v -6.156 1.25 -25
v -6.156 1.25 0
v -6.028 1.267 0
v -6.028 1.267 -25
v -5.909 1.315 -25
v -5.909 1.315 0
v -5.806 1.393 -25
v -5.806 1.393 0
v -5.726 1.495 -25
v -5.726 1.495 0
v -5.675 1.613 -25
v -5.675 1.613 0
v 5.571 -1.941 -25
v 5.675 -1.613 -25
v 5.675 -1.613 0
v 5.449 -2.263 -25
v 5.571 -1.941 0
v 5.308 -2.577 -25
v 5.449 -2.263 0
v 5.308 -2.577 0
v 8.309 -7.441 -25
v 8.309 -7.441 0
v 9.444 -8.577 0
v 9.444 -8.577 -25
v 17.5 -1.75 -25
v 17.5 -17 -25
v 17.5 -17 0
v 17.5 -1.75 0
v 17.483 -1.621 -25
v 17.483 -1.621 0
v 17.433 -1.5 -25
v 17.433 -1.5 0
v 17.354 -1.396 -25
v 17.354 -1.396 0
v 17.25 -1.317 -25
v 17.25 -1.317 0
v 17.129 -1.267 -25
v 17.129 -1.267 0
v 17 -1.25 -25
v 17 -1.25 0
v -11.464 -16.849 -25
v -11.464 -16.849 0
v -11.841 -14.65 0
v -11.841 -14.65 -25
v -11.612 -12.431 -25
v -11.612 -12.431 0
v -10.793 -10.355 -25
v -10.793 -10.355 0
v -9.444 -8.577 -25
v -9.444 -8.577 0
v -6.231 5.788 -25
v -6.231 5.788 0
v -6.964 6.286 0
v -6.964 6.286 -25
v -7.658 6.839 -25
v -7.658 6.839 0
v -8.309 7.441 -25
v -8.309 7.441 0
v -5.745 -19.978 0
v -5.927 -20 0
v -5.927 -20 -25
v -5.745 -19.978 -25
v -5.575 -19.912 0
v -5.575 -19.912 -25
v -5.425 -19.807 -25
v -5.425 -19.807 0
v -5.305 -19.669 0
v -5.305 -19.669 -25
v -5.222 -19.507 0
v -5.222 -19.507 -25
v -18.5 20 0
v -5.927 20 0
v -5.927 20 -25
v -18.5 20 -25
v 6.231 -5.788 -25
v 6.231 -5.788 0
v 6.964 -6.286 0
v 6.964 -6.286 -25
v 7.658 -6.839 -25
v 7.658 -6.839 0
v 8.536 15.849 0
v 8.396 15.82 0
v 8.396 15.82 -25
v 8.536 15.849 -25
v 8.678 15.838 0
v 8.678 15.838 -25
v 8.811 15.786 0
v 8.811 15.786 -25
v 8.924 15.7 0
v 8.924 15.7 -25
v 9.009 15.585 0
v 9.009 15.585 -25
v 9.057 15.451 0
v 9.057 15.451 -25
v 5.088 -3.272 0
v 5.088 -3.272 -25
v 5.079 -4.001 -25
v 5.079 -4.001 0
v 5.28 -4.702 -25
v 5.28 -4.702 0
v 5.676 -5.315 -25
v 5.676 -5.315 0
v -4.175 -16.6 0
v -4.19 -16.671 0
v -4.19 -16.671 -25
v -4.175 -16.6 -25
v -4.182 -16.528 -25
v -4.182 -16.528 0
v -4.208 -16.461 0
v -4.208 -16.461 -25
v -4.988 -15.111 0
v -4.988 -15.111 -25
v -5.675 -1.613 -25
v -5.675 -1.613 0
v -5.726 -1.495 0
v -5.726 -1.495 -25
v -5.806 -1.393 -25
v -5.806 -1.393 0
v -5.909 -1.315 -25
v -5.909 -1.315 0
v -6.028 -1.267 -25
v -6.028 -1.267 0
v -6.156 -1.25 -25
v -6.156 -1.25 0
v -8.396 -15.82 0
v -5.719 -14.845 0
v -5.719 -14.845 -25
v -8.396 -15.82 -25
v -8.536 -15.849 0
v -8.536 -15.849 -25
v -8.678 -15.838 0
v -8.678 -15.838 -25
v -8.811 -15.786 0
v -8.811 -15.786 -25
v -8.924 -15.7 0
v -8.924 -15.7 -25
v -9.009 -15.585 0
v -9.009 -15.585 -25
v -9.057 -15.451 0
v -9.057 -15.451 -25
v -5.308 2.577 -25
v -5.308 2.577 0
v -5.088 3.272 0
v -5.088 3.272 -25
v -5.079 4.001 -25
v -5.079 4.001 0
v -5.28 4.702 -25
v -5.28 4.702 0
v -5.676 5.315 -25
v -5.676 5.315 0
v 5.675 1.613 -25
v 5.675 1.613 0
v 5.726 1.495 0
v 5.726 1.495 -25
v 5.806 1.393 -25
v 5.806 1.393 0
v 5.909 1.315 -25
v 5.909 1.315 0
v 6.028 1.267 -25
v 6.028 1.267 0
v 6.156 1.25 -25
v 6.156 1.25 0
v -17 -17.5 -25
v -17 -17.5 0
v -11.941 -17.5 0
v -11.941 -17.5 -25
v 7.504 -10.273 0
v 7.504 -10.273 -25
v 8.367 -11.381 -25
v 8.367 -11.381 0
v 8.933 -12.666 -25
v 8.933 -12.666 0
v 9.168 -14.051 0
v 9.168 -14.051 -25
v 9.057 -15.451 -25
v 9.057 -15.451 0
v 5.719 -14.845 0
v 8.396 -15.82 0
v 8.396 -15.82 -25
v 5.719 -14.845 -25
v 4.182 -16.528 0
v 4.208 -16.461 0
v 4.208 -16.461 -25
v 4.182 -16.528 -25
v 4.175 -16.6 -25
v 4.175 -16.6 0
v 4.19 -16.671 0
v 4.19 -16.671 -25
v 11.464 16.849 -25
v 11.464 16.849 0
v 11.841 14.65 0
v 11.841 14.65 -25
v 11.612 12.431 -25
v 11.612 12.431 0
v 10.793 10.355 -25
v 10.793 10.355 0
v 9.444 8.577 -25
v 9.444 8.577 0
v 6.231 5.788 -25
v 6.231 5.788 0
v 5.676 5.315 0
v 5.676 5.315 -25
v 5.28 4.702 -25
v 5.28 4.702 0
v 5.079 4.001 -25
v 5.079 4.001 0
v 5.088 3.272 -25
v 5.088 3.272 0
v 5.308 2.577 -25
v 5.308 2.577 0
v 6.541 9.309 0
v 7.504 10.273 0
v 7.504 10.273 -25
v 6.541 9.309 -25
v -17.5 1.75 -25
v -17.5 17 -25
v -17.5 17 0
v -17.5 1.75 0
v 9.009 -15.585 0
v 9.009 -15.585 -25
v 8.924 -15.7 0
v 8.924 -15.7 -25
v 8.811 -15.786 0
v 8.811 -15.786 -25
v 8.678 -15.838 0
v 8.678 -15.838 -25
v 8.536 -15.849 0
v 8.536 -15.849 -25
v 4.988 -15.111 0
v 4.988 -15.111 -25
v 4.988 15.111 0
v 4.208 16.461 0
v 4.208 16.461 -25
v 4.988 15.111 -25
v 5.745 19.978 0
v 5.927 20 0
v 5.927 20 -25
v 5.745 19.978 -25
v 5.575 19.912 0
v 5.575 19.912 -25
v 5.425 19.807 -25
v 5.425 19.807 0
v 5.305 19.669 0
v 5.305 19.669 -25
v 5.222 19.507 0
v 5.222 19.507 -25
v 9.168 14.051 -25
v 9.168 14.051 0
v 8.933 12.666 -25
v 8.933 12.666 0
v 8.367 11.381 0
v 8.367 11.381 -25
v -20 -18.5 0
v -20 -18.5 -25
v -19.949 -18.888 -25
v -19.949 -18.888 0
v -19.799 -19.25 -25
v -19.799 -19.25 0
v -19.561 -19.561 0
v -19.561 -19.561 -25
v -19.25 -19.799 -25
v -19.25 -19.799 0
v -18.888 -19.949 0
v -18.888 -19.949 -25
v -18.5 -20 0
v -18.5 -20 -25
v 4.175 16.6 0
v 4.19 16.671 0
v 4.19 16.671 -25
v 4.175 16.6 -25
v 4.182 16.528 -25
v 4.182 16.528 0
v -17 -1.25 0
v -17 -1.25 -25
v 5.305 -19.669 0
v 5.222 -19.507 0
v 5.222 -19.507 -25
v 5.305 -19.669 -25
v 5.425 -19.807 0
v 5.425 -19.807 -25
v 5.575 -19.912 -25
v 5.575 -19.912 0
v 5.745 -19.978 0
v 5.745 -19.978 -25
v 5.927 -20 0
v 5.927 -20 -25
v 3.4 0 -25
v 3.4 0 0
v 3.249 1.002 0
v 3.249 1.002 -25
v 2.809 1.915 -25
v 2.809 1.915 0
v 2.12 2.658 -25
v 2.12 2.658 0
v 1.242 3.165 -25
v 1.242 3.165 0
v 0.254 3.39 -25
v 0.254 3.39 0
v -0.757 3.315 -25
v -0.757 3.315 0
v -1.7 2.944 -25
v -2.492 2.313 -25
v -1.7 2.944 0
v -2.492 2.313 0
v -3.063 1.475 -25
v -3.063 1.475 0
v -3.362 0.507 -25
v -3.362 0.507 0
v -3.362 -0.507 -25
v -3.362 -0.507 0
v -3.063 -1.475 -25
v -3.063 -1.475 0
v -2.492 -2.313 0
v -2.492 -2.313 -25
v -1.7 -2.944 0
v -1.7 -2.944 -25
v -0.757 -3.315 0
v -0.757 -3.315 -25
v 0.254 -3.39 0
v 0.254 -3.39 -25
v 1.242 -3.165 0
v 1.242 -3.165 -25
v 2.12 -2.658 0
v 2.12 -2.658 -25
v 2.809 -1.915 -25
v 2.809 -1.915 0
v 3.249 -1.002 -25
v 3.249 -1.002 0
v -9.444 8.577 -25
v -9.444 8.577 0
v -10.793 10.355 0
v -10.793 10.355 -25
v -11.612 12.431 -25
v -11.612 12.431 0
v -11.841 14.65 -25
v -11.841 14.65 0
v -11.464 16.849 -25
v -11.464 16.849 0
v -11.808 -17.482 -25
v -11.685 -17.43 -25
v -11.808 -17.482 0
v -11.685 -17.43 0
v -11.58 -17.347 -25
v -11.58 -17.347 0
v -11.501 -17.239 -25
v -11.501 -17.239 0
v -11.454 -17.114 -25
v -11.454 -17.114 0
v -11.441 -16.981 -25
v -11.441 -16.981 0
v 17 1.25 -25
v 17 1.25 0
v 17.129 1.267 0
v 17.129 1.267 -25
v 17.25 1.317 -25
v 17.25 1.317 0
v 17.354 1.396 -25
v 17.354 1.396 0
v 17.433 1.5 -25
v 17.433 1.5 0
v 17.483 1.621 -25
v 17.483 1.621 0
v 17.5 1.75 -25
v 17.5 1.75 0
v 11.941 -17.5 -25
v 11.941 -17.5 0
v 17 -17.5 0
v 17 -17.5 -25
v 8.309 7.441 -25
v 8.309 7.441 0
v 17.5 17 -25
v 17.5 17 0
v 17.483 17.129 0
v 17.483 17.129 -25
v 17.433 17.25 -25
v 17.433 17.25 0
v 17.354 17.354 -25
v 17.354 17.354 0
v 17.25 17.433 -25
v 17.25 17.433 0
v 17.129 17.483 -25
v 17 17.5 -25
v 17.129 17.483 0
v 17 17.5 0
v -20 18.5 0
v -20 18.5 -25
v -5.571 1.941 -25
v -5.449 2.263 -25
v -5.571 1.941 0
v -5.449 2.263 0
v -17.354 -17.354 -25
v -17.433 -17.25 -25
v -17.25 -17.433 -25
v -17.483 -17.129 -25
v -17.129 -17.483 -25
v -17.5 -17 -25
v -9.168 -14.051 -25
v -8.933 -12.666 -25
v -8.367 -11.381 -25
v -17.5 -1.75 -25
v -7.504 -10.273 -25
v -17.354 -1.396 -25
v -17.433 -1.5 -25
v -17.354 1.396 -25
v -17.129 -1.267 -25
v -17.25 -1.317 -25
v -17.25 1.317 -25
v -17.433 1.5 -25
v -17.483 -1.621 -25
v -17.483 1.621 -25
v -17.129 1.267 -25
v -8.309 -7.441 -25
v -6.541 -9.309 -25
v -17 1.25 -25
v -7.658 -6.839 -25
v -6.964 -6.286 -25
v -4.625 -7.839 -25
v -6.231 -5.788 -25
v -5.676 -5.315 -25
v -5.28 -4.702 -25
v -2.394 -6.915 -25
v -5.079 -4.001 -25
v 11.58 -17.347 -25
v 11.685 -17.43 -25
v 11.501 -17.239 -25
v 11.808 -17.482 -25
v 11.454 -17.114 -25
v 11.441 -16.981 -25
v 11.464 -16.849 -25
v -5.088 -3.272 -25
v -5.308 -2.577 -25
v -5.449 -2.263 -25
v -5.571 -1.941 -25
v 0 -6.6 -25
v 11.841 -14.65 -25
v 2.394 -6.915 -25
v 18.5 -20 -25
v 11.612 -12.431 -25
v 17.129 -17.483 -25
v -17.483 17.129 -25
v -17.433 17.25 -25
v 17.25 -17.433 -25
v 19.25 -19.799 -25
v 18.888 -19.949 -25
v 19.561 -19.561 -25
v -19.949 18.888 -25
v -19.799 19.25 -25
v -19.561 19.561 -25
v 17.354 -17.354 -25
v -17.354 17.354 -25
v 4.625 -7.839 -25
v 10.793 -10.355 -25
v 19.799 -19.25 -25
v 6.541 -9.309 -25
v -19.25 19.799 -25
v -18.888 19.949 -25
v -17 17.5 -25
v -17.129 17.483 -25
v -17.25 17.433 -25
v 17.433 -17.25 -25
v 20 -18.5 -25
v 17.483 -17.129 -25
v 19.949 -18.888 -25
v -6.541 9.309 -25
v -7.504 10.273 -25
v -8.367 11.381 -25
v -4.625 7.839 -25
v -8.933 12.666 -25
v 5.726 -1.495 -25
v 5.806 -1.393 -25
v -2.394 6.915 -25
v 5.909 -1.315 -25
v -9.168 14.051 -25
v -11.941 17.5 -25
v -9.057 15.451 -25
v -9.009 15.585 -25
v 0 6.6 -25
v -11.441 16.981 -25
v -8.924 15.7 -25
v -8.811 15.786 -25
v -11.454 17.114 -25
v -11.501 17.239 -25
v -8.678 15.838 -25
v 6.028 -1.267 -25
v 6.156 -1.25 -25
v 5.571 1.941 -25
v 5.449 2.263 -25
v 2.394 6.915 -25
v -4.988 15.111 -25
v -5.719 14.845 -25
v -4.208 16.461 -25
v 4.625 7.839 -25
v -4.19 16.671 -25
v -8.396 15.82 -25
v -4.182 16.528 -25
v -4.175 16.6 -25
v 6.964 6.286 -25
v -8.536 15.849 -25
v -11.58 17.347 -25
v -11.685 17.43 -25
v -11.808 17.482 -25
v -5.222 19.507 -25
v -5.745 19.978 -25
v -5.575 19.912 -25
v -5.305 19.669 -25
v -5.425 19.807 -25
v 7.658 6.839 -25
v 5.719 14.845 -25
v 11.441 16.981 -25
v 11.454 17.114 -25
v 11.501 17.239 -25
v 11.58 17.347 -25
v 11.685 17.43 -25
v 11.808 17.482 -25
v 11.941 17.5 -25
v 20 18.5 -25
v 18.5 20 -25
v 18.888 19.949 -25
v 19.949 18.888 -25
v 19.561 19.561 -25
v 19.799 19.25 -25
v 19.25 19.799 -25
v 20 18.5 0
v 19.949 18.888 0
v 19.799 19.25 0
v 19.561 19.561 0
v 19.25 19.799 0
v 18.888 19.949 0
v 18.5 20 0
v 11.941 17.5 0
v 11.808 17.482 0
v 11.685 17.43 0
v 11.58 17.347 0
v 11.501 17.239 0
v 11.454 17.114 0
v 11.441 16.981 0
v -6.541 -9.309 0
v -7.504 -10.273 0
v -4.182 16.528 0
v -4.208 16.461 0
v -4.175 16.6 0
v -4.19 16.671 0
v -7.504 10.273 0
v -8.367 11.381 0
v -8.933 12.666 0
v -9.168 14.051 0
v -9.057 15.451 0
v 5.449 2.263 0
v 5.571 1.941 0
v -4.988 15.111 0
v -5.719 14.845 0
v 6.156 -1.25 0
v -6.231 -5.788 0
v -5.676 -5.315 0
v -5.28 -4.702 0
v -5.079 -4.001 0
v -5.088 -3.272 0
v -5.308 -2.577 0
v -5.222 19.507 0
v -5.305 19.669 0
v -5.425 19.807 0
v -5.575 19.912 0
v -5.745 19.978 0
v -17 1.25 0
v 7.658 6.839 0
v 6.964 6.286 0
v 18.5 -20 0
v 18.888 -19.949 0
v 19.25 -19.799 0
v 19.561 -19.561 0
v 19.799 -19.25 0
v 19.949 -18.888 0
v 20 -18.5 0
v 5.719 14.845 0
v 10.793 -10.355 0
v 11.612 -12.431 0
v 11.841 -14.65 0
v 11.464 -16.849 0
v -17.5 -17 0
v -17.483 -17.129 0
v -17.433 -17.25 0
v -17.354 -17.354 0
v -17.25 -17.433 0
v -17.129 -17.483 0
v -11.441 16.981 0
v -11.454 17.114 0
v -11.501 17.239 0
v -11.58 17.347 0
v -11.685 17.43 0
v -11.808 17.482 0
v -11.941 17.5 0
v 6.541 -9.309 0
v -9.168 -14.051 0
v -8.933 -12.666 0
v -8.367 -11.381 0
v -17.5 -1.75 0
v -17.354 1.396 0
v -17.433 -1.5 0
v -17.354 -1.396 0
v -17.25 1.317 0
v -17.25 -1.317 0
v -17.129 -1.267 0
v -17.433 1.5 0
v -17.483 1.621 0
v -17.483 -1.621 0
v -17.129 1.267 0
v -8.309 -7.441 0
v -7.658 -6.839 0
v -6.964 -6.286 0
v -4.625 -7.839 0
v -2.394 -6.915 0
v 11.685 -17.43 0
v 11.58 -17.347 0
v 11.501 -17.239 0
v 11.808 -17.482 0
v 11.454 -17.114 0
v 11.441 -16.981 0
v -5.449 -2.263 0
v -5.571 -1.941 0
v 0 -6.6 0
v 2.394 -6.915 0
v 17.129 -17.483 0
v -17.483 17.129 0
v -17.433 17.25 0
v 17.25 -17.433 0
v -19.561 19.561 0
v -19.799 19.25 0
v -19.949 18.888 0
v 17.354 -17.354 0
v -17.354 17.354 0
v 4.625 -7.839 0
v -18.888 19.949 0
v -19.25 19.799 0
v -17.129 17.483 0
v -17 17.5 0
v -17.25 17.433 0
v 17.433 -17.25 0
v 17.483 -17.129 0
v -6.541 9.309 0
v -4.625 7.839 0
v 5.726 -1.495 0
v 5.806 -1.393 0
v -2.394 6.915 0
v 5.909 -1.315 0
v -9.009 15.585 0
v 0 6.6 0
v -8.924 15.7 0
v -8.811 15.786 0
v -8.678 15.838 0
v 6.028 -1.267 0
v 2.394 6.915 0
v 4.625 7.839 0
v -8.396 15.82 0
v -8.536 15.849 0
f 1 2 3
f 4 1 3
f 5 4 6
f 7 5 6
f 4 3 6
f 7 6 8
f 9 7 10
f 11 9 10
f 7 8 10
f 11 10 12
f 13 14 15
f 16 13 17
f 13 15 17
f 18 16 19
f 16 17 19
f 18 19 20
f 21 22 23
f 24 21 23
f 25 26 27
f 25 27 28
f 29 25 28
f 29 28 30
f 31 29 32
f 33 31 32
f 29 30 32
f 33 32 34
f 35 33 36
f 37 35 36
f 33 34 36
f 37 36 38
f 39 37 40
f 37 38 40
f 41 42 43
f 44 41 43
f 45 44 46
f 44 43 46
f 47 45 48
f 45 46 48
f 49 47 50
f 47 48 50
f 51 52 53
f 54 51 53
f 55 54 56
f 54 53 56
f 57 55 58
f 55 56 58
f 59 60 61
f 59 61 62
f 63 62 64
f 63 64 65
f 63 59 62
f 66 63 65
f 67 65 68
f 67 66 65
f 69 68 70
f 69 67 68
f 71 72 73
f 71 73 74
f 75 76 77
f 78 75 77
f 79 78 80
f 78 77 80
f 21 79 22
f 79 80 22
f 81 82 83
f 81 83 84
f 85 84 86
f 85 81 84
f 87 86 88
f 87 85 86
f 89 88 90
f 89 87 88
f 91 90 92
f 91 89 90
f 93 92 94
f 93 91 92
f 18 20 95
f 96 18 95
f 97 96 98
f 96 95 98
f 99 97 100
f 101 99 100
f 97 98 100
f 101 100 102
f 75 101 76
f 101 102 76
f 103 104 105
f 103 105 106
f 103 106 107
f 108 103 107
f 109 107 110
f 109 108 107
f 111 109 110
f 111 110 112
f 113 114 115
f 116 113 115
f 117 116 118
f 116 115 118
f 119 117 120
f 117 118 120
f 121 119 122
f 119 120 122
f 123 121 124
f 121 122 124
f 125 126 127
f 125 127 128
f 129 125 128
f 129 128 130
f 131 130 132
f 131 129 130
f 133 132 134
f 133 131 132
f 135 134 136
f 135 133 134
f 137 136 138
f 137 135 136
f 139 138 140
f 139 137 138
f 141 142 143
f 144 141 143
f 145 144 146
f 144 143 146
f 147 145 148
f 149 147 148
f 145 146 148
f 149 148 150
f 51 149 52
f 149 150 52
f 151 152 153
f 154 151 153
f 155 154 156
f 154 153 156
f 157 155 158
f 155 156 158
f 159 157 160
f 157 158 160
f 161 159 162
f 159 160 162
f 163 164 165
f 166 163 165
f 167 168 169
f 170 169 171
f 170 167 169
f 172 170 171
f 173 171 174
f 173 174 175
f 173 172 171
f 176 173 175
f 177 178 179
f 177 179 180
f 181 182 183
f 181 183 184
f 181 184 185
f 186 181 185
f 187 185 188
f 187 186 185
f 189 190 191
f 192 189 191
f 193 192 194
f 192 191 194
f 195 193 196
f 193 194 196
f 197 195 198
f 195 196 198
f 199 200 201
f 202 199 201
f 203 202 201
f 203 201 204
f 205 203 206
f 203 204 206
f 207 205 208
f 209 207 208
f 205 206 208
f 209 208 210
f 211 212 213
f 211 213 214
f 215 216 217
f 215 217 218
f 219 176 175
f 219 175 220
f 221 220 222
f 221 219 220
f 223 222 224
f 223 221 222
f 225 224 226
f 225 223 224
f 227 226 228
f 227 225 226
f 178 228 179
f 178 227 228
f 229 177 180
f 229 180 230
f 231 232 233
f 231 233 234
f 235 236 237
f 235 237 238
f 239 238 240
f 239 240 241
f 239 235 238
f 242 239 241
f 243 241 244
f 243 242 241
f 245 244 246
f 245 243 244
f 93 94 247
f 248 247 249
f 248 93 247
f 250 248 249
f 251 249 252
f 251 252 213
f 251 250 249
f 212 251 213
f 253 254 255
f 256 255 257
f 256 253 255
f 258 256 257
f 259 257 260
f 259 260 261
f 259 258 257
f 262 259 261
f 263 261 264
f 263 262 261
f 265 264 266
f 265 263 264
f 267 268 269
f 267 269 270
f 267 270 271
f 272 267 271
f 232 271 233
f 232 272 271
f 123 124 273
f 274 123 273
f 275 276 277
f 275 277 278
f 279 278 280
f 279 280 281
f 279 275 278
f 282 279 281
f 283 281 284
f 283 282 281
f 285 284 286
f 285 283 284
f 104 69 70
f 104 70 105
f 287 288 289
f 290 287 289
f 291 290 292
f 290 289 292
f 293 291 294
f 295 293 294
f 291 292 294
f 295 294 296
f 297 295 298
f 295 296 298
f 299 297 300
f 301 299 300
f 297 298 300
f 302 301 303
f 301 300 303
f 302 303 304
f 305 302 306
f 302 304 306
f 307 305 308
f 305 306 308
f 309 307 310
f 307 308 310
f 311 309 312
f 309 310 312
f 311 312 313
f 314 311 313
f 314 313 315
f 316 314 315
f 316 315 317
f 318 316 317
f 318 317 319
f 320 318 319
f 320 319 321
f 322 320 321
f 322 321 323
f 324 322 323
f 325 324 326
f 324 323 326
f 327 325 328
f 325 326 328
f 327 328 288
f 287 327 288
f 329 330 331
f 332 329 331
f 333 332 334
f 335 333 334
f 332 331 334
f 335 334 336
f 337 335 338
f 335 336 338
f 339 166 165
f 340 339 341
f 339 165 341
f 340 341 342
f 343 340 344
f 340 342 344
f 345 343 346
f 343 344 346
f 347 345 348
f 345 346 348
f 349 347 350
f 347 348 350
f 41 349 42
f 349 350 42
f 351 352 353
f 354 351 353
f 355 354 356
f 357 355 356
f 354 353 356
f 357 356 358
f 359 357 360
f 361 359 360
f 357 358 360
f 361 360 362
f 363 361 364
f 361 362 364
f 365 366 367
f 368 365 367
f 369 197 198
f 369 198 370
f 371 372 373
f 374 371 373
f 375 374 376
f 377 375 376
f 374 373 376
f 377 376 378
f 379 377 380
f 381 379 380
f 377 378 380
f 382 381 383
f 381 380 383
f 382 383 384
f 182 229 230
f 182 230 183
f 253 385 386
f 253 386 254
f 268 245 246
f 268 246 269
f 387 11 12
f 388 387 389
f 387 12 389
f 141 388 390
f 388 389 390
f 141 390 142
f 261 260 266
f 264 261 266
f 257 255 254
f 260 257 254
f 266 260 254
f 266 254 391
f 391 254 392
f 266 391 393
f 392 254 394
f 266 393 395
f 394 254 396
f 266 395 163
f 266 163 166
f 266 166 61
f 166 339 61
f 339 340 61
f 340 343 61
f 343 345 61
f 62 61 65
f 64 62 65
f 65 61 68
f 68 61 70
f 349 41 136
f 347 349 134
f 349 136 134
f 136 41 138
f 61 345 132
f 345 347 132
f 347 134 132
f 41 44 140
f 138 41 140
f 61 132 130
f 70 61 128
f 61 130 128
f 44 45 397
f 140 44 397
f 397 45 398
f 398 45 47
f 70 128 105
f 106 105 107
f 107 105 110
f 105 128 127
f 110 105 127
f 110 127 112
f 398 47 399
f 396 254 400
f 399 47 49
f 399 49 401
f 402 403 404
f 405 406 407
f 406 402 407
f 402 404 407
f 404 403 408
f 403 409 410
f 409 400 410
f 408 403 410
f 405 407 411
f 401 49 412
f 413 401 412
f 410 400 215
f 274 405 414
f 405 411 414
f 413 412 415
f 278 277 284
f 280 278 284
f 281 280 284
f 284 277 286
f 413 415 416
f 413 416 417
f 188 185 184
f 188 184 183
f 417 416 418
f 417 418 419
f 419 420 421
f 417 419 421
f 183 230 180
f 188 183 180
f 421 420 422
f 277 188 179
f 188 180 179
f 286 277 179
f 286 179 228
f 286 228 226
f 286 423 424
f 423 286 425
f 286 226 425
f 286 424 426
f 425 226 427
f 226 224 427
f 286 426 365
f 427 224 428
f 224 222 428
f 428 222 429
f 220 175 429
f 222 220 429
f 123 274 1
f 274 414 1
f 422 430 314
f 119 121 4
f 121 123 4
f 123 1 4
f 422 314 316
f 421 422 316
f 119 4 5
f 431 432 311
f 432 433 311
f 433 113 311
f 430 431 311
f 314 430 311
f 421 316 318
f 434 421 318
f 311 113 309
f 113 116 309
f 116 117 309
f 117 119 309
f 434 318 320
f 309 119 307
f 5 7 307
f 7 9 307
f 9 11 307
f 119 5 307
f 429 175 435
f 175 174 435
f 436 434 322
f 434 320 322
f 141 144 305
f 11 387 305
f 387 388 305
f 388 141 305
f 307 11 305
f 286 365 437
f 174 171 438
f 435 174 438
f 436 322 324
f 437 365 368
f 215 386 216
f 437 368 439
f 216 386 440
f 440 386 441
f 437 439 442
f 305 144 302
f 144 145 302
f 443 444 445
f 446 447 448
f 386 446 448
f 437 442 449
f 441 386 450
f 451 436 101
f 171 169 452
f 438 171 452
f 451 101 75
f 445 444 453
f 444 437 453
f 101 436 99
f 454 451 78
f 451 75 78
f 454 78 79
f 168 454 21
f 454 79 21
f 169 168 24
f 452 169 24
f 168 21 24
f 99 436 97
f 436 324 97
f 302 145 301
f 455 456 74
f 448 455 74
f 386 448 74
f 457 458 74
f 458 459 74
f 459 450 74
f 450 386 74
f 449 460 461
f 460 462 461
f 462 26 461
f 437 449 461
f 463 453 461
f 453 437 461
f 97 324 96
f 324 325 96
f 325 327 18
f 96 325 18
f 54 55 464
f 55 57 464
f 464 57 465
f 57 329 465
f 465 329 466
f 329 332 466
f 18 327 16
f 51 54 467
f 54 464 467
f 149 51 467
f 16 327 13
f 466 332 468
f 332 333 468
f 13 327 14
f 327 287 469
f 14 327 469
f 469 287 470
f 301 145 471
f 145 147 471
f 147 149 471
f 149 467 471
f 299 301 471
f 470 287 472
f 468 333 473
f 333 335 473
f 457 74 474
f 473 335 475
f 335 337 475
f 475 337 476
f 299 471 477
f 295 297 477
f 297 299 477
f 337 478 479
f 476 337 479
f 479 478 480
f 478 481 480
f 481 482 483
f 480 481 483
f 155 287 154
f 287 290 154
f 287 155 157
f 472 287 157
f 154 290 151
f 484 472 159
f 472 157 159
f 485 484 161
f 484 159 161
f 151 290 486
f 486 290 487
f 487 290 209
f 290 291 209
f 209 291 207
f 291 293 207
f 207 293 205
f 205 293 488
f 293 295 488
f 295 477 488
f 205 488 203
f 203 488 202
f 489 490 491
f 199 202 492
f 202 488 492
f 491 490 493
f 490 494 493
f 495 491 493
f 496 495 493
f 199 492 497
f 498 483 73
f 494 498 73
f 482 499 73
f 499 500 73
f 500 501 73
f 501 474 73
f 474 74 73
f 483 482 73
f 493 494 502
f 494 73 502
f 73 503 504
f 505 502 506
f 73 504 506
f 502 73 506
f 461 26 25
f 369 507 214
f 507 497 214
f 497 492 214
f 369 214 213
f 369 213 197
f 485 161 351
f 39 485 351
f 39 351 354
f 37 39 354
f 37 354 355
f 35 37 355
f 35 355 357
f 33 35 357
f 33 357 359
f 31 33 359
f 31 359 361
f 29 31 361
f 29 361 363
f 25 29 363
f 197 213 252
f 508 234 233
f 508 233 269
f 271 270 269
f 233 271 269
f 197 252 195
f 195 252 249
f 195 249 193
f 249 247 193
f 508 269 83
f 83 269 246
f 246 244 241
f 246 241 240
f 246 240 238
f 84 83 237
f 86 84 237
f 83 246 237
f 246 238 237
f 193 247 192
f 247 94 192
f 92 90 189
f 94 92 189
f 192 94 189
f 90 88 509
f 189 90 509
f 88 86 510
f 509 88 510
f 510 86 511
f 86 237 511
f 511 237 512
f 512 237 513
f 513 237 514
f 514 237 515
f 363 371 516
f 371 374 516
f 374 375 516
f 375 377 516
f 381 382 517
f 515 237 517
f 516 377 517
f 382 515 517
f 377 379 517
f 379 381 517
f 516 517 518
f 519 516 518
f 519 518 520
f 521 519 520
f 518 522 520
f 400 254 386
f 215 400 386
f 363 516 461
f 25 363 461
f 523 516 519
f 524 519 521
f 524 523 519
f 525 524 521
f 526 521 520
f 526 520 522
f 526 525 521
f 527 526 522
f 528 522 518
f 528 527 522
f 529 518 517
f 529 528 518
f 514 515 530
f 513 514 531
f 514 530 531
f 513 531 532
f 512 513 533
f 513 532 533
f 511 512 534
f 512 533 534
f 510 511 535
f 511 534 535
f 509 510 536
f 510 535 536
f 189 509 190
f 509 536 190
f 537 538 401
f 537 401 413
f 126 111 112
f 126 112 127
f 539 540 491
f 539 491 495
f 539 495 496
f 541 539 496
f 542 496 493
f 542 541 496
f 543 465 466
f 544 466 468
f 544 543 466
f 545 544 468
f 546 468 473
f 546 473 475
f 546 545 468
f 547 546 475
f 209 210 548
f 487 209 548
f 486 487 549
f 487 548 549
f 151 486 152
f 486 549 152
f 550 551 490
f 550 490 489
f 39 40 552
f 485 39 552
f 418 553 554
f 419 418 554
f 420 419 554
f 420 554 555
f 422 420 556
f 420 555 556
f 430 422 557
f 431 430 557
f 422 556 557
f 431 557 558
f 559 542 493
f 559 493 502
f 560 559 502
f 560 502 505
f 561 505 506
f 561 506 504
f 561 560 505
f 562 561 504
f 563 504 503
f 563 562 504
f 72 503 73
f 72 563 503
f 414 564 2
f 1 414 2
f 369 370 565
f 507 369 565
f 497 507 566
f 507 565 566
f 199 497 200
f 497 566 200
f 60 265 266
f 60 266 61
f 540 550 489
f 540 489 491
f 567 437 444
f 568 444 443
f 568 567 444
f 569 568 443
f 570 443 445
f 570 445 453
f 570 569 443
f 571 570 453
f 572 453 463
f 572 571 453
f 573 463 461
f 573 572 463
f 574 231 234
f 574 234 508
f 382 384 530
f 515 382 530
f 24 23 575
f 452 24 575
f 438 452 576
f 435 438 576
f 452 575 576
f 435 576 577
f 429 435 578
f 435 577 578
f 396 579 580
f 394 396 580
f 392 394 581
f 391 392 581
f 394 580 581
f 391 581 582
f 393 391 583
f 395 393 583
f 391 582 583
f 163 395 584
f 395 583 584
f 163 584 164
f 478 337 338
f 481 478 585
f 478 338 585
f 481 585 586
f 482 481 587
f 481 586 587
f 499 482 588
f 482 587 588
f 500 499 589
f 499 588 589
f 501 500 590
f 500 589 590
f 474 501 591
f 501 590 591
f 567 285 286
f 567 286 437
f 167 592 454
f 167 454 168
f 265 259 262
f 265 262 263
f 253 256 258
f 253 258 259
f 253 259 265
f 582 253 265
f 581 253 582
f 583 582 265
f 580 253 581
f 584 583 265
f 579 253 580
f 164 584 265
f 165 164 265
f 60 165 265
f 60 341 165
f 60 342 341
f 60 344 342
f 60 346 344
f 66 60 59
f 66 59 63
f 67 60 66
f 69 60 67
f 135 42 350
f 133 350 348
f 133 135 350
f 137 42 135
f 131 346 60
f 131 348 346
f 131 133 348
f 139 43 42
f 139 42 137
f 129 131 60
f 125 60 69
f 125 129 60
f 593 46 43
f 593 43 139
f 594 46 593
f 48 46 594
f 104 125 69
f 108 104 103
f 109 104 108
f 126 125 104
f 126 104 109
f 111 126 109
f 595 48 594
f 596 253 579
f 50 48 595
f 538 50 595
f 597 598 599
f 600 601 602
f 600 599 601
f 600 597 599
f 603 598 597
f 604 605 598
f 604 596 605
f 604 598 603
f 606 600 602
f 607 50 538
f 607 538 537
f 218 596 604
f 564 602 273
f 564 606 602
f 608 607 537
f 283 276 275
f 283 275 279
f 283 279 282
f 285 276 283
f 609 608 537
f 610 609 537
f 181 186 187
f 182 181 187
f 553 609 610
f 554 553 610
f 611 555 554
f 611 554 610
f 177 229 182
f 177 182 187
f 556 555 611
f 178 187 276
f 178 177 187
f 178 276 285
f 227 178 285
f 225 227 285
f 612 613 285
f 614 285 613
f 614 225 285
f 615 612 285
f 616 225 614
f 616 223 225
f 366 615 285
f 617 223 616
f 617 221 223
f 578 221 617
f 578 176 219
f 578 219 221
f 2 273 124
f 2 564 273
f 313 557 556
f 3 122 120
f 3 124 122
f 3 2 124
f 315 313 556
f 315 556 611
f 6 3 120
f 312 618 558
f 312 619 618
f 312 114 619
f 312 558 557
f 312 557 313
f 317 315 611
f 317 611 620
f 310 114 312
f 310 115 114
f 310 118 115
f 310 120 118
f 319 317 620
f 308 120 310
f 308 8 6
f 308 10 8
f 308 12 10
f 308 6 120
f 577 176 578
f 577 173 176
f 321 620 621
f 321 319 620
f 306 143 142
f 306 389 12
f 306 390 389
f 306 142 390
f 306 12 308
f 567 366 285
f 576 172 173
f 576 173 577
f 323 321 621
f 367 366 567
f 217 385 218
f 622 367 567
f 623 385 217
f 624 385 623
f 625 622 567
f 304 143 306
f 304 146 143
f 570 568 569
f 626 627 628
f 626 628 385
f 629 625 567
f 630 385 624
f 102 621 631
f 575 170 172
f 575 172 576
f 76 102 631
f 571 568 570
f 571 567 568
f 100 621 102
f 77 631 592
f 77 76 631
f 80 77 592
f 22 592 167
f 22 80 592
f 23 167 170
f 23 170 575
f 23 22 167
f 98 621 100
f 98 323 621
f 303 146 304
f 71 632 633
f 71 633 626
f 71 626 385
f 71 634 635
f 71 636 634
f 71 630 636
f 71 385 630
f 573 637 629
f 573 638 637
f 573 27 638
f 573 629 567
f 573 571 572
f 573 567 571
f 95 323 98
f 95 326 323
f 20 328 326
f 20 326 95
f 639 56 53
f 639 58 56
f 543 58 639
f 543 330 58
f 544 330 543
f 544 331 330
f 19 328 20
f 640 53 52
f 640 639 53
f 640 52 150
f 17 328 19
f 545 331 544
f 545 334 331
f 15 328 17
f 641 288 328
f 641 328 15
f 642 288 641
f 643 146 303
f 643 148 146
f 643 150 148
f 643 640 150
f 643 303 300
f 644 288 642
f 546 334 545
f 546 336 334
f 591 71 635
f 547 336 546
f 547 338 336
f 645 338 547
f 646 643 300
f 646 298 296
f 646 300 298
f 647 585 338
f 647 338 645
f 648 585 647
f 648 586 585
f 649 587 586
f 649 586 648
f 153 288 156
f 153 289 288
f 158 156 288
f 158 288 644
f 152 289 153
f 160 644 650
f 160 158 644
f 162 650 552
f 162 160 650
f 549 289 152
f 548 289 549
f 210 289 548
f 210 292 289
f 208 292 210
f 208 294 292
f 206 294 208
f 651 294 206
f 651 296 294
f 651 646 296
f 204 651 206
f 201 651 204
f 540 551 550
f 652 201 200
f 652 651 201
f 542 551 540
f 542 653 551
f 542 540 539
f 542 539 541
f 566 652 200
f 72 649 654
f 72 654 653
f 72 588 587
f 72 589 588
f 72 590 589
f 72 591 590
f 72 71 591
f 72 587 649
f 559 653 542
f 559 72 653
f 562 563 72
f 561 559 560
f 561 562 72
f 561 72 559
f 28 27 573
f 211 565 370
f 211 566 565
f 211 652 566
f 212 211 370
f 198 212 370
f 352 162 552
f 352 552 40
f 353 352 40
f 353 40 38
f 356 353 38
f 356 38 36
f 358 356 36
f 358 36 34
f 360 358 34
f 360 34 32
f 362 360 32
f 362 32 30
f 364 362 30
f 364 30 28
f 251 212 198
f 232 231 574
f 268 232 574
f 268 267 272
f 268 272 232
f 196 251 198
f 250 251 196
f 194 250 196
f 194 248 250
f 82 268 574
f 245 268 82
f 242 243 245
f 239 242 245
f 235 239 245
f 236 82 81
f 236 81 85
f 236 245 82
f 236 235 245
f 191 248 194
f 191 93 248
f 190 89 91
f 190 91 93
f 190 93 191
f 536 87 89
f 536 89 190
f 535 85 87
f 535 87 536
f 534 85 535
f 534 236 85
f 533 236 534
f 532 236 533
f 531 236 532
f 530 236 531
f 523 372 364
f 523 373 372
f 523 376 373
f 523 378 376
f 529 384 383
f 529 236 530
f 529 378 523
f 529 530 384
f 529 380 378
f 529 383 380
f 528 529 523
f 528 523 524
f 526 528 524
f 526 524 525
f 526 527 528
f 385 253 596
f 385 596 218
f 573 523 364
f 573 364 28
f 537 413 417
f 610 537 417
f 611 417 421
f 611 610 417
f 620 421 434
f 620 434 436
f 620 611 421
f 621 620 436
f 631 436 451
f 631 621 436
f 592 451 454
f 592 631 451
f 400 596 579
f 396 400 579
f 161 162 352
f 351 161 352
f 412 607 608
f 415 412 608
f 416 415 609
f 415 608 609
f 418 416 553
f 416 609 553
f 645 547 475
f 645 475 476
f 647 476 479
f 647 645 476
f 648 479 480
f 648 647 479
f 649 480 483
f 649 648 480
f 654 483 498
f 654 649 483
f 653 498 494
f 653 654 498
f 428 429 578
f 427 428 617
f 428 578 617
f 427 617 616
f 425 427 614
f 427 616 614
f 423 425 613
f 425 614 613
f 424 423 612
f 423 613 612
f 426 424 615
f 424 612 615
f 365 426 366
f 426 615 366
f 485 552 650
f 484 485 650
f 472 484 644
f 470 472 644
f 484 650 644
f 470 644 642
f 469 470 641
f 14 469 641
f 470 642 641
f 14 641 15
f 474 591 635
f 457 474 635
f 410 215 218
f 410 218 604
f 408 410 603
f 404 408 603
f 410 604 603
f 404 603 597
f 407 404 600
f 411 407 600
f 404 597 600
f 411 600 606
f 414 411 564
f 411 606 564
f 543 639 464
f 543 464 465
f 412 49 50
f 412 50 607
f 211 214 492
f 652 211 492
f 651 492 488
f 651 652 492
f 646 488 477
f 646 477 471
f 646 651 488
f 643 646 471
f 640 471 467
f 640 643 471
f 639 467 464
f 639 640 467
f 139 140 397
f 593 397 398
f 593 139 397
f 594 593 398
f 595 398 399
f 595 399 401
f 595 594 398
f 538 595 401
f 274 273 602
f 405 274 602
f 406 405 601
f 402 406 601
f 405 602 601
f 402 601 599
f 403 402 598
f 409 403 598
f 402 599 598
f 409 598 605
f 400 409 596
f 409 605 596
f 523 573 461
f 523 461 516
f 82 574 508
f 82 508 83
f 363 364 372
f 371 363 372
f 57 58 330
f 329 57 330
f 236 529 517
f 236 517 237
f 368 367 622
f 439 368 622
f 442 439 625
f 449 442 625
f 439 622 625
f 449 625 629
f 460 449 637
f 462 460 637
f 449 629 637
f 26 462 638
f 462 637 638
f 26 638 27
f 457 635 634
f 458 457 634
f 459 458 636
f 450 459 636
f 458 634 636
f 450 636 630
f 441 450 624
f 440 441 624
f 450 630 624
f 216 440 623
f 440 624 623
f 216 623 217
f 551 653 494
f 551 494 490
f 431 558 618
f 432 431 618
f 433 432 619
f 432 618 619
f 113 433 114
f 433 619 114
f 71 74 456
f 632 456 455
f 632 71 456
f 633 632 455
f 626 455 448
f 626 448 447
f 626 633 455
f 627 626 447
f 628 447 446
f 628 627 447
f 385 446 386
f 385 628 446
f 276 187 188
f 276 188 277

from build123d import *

# Parameters (mm, degrees)
SK_MAIN_EXTRUSION_R  = 3.4
MAIN_EXTRUSION_DEPTH = 25


with BuildPart() as part:
    # Sk Main Extrusion → Main Extrusion (new body)
    with BuildSketch(Plane.XY):
        with BuildLine():
            Line((-4.190076845, 16.671180212), (-5.222054351, 19.506515107))
            ThreePointArc((-5.222054351, 19.506515107), (-5.496641489, 19.864364033), (-5.926823816, 20))
            Line((-5.926823816, 20), (-18.5, 20))
            ThreePointArc((-18.5, 20), (-19.560660172, 19.560660172), (-20, 18.5))
            Line((-20, 18.5), (-20, -18.5))
            ThreePointArc((-20, -18.5), (-19.560660172, -19.560660172), (-18.5, -20))
            Line((-18.5, -20), (-5.926823816, -20))
            ThreePointArc((-5.926823816, -20), (-5.496641489, -19.864364033), (-5.222054351, -19.506515107))
            Line((-5.222054351, -19.506515107), (-4.190076845, -16.671180212))
            ThreePointArc((-4.190076845, -16.671180212), (-4.175951325, -16.563886241), (-4.208493649, -16.460675177))
            Line((-4.208493649, -16.460675177), (-4.987558066, -15.111296024))
            Line((-4.987558066, -15.111296024), (-5.718509166, -14.845251581))
            Line((-5.718509166, -14.845251581), (-8.396186179, -15.81984631))
            ThreePointArc((-8.396186179, -15.81984631), (-8.811074612, -15.786489799), (-9.056960151, -15.450654467))
            ThreePointArc((-9.056960151, -15.450654467), (-8.933433013, -12.665882372), (-7.504160339, -10.272684887))
            Line((-7.504160339, -10.272684887), (-6.540737726, -9.309262274))
            ThreePointArc((-6.540737726, -9.309262274), (0, -6.6), (6.540737726, -9.309262274))
            Line((6.540737726, -9.309262274), (7.504160339, -10.272684887))
            ThreePointArc((7.504160339, -10.272684887), (8.933433013, -12.665882372), (9.056960151, -15.450654467))
            ThreePointArc((9.056960151, -15.450654467), (8.811074612, -15.786489799), (8.396186179, -15.81984631))
            Line((8.396186179, -15.81984631), (5.718509166, -14.845251581))
            Line((5.718509166, -14.845251581), (4.987558066, -15.111296024))
            Line((4.987558066, -15.111296024), (4.208493649, -16.460675177))
            ThreePointArc((4.208493649, -16.460675177), (4.175951325, -16.563886241), (4.190076845, -16.671180212))
            Line((4.190076845, -16.671180212), (5.222054351, -19.506515107))
            ThreePointArc((5.222054351, -19.506515107), (5.496641489, -19.864364033), (5.926823816, -20))
            Line((5.926823816, -20), (18.5, -20))
            ThreePointArc((18.5, -20), (19.560660172, -19.560660172), (20, -18.5))
            Line((20, -18.5), (20, 18.5))
            ThreePointArc((20, 18.5), (19.560660172, 19.560660172), (18.5, 20))
            Line((18.5, 20), (5.926823816, 20))
            ThreePointArc((5.926823816, 20), (5.496641489, 19.864364033), (5.222054351, 19.506515107))
            Line((5.222054351, 19.506515107), (4.190076845, 16.671180212))
            ThreePointArc((4.190076845, 16.671180212), (4.175951325, 16.563886241), (4.208493649, 16.460675177))
            Line((4.208493649, 16.460675177), (4.987558066, 15.111296024))
            Line((4.987558066, 15.111296024), (5.718509166, 14.845251581))
            Line((5.718509166, 14.845251581), (8.396186179, 15.81984631))
            ThreePointArc((8.396186179, 15.81984631), (8.811074612, 15.786489799), (9.056960151, 15.450654467))
            ThreePointArc((9.056960151, 15.450654467), (8.933433013, 12.665882372), (7.504160339, 10.272684887))
            Line((7.504160339, 10.272684887), (6.540737726, 9.309262274))
            ThreePointArc((6.540737726, 9.309262274), (0, 6.6), (-6.540737726, 9.309262274))
            Line((-6.540737726, 9.309262274), (-7.504160339, 10.272684887))
            ThreePointArc((-7.504160339, 10.272684887), (-8.933433013, 12.665882372), (-9.056960151, 15.450654467))
            ThreePointArc((-9.056960151, 15.450654467), (-8.811074612, 15.786489799), (-8.396186179, 15.81984631))
            Line((-8.396186179, 15.81984631), (-5.718509166, 14.845251581))
            Line((-5.718509166, 14.845251581), (-4.987558066, 15.111296024))
            Line((-4.987558066, 15.111296024), (-4.208493649, 16.460675177))
            ThreePointArc((-4.208493649, 16.460675177), (-4.175951325, 16.563886241), (-4.190076845, 16.671180212))
        make_face()
        Circle(SK_MAIN_EXTRUSION_R, mode=Mode.SUBTRACT)
        with BuildLine():
            Line((-8.308504679, 7.441495321), (-9.444282589, 8.577273231))
            ThreePointArc((-9.444282589, 8.577273231), (-11.611987193, 12.430514315), (-11.464011904, 16.849169473))
            ThreePointArc((-11.464011904, 16.849169473), (-11.537349181, 17.295452819), (-11.940719521, 17.5))
            Line((-11.940719521, 17.5), (-17, 17.5))
            ThreePointArc((-17, 17.5), (-17.353553391, 17.353553391), (-17.5, 17))
            Line((-17.5, 17), (-17.5, 1.75))
            ThreePointArc((-17.5, 1.75), (-17.353553391, 1.396446609), (-17, 1.25))
            Line((-17, 1.25), (-6.156094541, 1.25))
            ThreePointArc((-6.156094541, 1.25), (-5.854730455, 1.351026708), (-5.675149655, 1.61328125))
            ThreePointArc((-5.675149655, 1.61328125), (-5.51245547, 2.10305366), (-5.307583096, 2.576734694))
            ThreePointArc((-5.307583096, 2.576734694), (-5.153883821, 4.359333373), (-6.230846881, 5.788120301))
            ThreePointArc((-6.230846881, 5.788120301), (-7.316529108, 6.555931161), (-8.308504679, 7.441495321))
        make_face(mode=Mode.SUBTRACT)
        with BuildLine():
            Line((-17.5, -1.75), (-17.5, -17))
            ThreePointArc((-17.5, -17), (-17.353553391, -17.353553391), (-17, -17.5))
            Line((-17, -17.5), (-11.940719521, -17.5))
            ThreePointArc((-11.940719521, -17.5), (-11.537349181, -17.295452819), (-11.464011904, -16.849169473))
            ThreePointArc((-11.464011904, -16.849169473), (-11.611987193, -12.430514315), (-9.444282589, -8.577273231))
            Line((-9.444282589, -8.577273231), (-8.308504679, -7.441495321))
            ThreePointArc((-8.308504679, -7.441495321), (-7.316529108, -6.555931161), (-6.230846881, -5.788120301))
            ThreePointArc((-6.230846881, -5.788120301), (-5.153883821, -4.359333373), (-5.307583096, -2.576734694))
            ThreePointArc((-5.307583096, -2.576734694), (-5.51245547, -2.10305366), (-5.675149655, -1.61328125))
            ThreePointArc((-5.675149655, -1.61328125), (-5.854730455, -1.351026708), (-6.156094541, -1.25))
            Line((-6.156094541, -1.25), (-17, -1.25))
            ThreePointArc((-17, -1.25), (-17.353553391, -1.396446609), (-17.5, -1.75))
        make_face(mode=Mode.SUBTRACT)
        with BuildLine():
            Line((9.444282589, 8.577273231), (8.308504679, 7.441495321))
            ThreePointArc((8.308504679, 7.441495321), (7.316529108, 6.555931161), (6.230846881, 5.788120301))
            ThreePointArc((6.230846881, 5.788120301), (5.153883821, 4.359333373), (5.307583096, 2.576734694))
            ThreePointArc((5.307583096, 2.576734694), (5.51245547, 2.10305366), (5.675149655, 1.61328125))
            ThreePointArc((5.675149655, 1.61328125), (5.854730455, 1.351026708), (6.156094541, 1.25))
            Line((6.156094541, 1.25), (17, 1.25))
            ThreePointArc((17, 1.25), (17.353553391, 1.396446609), (17.5, 1.75))
            Line((17.5, 1.75), (17.5, 17))
            ThreePointArc((17.5, 17), (17.353553391, 17.353553391), (17, 17.5))
            Line((17, 17.5), (11.940719521, 17.5))
            ThreePointArc((11.940719521, 17.5), (11.537349181, 17.295452819), (11.464011904, 16.849169473))
            ThreePointArc((11.464011904, 16.849169473), (11.611987193, 12.430514315), (9.444282589, 8.577273231))
        make_face(mode=Mode.SUBTRACT)
        with BuildLine():
            Line((8.308504679, -7.441495321), (9.444282589, -8.577273231))
            ThreePointArc((9.444282589, -8.577273231), (11.611987193, -12.430514315), (11.464011904, -16.849169473))
            ThreePointArc((11.464011904, -16.849169473), (11.537349181, -17.295452819), (11.940719521, -17.5))
            Line((11.940719521, -17.5), (17, -17.5))
            ThreePointArc((17, -17.5), (17.353553391, -17.353553391), (17.5, -17))
            Line((17.5, -17), (17.5, -1.75))
            ThreePointArc((17.5, -1.75), (17.353553391, -1.396446609), (17, -1.25))
            Line((17, -1.25), (6.156094541, -1.25))
            ThreePointArc((6.156094541, -1.25), (5.854730455, -1.351026708), (5.675149655, -1.61328125))
            ThreePointArc((5.675149655, -1.61328125), (5.51245547, -2.10305366), (5.307583096, -2.576734694))
            ThreePointArc((5.307583096, -2.576734694), (5.153883821, -4.359333373), (6.230846881, -5.788120301))
            ThreePointArc((6.230846881, -5.788120301), (7.316529108, -6.555931161), (8.308504679, -7.441495321))
        make_face(mode=Mode.SUBTRACT)
    extrude(amount=-MAIN_EXTRUSION_DEPTH)


solid = part.part
